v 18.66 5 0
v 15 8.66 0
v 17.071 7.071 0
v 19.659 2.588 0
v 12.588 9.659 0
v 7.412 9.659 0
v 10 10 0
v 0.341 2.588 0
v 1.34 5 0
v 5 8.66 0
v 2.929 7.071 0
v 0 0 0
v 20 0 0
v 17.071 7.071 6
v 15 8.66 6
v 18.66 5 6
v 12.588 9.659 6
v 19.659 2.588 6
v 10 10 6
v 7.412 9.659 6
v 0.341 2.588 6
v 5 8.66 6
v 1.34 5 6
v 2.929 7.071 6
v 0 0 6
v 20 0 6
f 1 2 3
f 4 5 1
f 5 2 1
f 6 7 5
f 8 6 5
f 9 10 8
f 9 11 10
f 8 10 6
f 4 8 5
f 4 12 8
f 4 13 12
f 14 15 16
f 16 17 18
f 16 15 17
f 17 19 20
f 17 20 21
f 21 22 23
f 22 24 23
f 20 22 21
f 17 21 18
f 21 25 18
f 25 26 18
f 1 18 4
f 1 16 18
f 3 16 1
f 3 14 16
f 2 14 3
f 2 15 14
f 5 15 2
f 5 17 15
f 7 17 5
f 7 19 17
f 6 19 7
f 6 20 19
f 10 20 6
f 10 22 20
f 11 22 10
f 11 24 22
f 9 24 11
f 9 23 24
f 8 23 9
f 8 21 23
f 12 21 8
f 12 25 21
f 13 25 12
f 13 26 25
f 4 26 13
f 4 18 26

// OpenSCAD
$fn = 32;

// ----------------------------------------------------------------------
// Key bar: woodruff key, 6 mm thick
// ----------------------------------------------------------------------

// --- parameters (mm) ---
profile_height = 6;       // extrusion height
profile_points = 13;      // points of the closed outline

profile = [[20, 0], [19.659, 2.588], [18.66, 5], [17.071, 7.071], [15, 8.66], [12.588, 9.659], [10, 10], [7.412, 9.659], [5, 8.66], [2.929, 7.071], [1.34, 5], [0.341, 2.588], [0, 0]];  // single closed polygon, 13 points, counter clockwise

// --- the one profile operation ---
linear_extrude(height = profile_height) polygon(points = profile);
